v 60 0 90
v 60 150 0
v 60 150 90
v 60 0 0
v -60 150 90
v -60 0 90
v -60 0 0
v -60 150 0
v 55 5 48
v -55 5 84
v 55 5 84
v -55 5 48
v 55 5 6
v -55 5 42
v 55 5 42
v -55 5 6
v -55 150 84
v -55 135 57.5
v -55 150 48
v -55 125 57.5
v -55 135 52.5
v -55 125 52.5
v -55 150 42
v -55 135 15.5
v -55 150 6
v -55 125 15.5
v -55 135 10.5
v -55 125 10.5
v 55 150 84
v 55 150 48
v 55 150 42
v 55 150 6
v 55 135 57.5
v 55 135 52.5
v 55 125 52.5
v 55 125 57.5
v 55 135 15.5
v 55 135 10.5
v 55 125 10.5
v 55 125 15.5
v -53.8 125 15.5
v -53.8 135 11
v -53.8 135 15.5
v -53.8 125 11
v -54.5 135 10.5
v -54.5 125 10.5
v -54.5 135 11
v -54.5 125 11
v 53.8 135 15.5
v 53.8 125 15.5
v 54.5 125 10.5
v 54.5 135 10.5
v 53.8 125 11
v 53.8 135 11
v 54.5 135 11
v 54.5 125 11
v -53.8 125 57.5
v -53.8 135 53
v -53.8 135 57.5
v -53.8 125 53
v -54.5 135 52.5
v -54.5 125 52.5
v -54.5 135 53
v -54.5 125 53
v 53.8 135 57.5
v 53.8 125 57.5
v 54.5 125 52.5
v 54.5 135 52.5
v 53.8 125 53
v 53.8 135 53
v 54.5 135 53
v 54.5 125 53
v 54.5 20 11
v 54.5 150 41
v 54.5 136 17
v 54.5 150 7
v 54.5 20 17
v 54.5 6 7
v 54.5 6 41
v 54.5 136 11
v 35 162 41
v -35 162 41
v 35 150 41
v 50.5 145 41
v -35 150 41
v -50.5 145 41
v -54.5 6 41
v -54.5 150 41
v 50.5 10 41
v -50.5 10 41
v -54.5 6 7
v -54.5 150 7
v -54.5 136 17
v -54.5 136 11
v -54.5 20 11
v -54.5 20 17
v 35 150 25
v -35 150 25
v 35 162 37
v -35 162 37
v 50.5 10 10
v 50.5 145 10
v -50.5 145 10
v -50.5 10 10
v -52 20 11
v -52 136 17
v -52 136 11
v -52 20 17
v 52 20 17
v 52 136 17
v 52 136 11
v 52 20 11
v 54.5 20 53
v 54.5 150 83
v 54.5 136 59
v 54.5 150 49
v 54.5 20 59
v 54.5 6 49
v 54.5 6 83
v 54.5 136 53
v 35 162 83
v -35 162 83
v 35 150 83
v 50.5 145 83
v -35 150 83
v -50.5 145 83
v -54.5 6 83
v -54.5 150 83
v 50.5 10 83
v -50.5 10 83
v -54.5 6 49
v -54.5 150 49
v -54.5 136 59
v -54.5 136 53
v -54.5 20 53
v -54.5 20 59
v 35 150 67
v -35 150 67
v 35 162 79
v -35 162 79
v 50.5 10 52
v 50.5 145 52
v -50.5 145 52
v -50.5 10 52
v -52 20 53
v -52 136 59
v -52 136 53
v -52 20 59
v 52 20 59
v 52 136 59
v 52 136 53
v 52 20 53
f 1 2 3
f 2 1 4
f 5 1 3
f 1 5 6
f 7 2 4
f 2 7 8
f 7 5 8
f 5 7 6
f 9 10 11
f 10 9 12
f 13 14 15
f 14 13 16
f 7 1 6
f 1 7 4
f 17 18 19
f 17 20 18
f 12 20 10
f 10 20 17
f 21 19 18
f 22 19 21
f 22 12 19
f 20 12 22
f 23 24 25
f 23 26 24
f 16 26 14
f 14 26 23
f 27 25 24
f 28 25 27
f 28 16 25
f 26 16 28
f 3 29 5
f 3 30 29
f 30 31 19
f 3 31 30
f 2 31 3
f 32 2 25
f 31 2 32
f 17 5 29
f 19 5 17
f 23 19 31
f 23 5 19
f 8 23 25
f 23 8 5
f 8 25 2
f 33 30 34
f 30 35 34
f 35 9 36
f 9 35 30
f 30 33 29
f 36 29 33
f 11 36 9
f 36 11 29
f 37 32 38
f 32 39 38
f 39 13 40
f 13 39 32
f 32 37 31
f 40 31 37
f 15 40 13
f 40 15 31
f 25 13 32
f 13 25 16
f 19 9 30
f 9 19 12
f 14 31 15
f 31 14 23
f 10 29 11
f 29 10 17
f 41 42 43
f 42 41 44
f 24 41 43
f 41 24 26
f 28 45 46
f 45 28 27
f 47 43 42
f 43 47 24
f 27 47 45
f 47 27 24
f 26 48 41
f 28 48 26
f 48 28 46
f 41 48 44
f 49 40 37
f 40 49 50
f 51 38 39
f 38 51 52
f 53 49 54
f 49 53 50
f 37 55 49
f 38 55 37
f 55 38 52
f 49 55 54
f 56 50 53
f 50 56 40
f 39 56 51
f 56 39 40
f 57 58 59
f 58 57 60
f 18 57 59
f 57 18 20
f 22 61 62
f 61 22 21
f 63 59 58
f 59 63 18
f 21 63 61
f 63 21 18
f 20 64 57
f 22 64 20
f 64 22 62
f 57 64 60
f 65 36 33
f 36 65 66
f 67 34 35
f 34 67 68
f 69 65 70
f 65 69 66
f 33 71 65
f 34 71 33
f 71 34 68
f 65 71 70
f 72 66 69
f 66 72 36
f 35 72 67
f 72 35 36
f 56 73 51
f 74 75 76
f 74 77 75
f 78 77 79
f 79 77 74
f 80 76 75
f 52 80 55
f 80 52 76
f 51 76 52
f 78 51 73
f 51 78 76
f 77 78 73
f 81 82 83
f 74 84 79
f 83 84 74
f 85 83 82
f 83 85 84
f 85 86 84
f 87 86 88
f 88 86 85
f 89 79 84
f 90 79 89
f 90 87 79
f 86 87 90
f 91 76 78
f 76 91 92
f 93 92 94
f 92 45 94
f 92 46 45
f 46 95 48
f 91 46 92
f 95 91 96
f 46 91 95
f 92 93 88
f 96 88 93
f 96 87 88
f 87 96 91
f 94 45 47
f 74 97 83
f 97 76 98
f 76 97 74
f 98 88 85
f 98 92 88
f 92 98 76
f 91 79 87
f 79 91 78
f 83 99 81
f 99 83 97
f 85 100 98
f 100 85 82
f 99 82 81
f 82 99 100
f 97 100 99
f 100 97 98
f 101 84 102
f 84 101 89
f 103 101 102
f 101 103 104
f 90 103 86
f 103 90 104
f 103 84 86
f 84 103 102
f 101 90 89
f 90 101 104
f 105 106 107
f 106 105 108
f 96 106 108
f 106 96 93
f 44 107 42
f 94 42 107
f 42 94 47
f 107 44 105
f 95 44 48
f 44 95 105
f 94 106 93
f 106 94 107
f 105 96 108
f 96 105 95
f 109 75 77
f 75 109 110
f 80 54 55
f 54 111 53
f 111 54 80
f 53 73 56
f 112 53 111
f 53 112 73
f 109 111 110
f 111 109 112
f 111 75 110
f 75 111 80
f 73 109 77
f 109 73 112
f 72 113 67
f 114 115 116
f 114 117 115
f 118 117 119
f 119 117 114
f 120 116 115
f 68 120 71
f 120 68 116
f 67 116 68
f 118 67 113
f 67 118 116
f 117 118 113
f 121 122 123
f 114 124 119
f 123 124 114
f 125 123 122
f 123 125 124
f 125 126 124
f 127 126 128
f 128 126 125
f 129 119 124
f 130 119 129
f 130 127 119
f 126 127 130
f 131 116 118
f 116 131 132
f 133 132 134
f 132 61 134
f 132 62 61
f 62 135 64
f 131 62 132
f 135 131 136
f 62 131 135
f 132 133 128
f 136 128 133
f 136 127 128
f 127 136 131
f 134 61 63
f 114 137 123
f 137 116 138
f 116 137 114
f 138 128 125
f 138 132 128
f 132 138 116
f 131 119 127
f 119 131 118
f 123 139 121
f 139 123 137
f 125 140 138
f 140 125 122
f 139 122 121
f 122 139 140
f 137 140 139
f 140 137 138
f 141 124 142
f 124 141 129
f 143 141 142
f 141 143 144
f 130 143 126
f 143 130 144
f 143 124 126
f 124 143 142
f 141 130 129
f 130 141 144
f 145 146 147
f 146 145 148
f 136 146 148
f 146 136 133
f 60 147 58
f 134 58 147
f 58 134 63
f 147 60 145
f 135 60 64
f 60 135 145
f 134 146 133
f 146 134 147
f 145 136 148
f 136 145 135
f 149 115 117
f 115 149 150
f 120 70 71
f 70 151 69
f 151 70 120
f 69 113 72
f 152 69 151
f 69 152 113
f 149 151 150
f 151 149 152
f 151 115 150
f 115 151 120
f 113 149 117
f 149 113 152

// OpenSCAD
part = "assembly"; // [assembly:Assembly, frame:Frame, drawer:Drawer]
cadverify_only = "";
module instance(name, part, unit = 1) {
    echo(cadverify_instance = [name, part, unit]);
    if (cadverify_only == "" || cadverify_only == name) children();
}
// frame assembly coords: X -60..60, Y 0..150, Z 0..90
module frame_asm() {
    union() {
        translate([-60,0,0]) cube([120,5,90]);
        translate([-60,0,0]) cube([5,150,90]);
        translate([55,0,0]) cube([5,150,90]);
        translate([-55,5,0]) cube([110,145,6]);
        translate([-55,5,42]) cube([110,145,6]);
        translate([-55,5,84]) cube([110,145,6]);
        translate([-55,125,10.5]) cube([1.2,10,5]);
        translate([53.8,125,10.5]) cube([1.2,10,5]);
        translate([-55,125,52.5]) cube([1.2,10,5]);
        translate([53.8,125,52.5]) cube([1.2,10,5]);
    }
}
module frame_print() {
    translate([0,90,0]) rotate([90,0,0]) frame_asm();
}
// drawer part coords: X -54.5..54.5, Y 0..144 body + handle to 156, Z 0..34
module drawer_raw() {
    difference() {
        union() {
            translate([-54.5,0,0]) cube([109,144,34]);
            // handle tip block
            translate([-35,144,30]) cube([70,12,4]);
            // handle wedge (triangular prism)
            polyhedron(points=[[-35,144,18],[-35,144,30],[-35,156,30],[35,144,18],[35,144,30],[35,156,30]], faces=[[0,1,2],[3,5,4],[0,3,4,1],[1,4,5,2],[0,2,5,3]]);
        }
        translate([-50.5,4,3]) cube([101,135,32]);
        translate([-54.5,14,4]) cube([2.5,116,6]);
        translate([52,14,4]) cube([2.5,116,6]);
    }
}
module drawer_part() { drawer_raw(); }
module frame_spec() {
    echo(cadverify_spec = [
        ["bounds", [[-60,0,0],[60,90,150]]],
        ["bodies", 1],
        ["through_holes", 0],
        ["support_faces", [["bed","-z",5000]]],
        ["overhangs_allowed", [
            ["stop tab underside, bridge 2.4mm", [[-55,74.5,124],[-53.8,79.5,126]]],
            ["stop tab underside, bridge 2.4mm", [[53.8,74.5,124],[55,79.5,126]]],
            ["stop tab underside, bridge 2.4mm", [[-55,32.5,124],[-53.8,37.5,126]]],
            ["stop tab underside, bridge 2.4mm", [[53.8,32.5,124],[55,37.5,126]]]
        ]],
        ["copies", 1],
        ["details", [
            ["back_panel","material",[[-60,0,0],[60,90,5]],0.9],
            ["stop_tab_ll","material",[[-55,74.5,125],[-53.8,79.5,135]],0.9],
            ["stop_tab_lr","material",[[53.8,74.5,125],[55,79.5,135]],0.9],
            ["stop_tab_ul","material",[[-55,32.5,125],[-53.8,37.5,135]],0.9],
            ["stop_tab_ur","material",[[53.8,32.5,125],[55,37.5,135]],0.9],
            ["lower_cavity","void",[[-55,48,5],[55,84,150]],0.9],
            ["upper_cavity","void",[[-55,6,5],[55,42,150]],0.9],
            ["back","thickness",[0,10,-1],[0,0,1],5]
        ]]
    ]);
}
module drawer_spec() {
    echo(cadverify_spec = [
        ["bounds", [[-54.5,0,0],[54.5,156,34]]],
        ["bodies", 1],
        ["through_holes", 0],
        ["support_faces", [["bed","-z",10000]]],
        ["overhangs_allowed", [
            ["drawer slide groove ceiling, bridge 5mm", [[-54.5,14,9],[-52,130,11]]],
            ["drawer slide groove ceiling, bridge 5mm", [[52,14,9],[54.5,130,11]]]
        ]],
        ["copies", 2],
        ["details", [
            ["pull_tip","material",[[-35,150,30],[35,156,34]],0.9],
            ["groove_left","void",[[-54.5,14,4],[-52,130,10]],0.9],
            ["groove_right","void",[[52,14,4],[54.5,130,10]],0.9],
            ["drawer_cavity","void",[[-50.5,4,3],[50.5,139,34]],0.9],
            ["bottom","thickness",[0,70,-1],[0,0,1],3],
            ["side_walls","thickness",[-55.5,70,20],[1,0,0],8],
            ["pull_shape","view",[[-35,144,18],[35,156,34]]]
        ]]
    ]);
}
module assembly_spec() {
    echo(cadverify_spec = [
        ["bounds", [[-60,0,0],[60,162,90]]],
        ["support_faces", [["base","-z",5000]]],
        ["allowed_interferences", []],
        ["motions", [
            ["drawer_lower_slide", ["drawer_lower"], "slide", [0,1,0], [0,105], ["stops", [0,105]]],
            ["drawer_upper_slide", ["drawer_upper"], "slide", [0,1,0], [0,105], ["stops", [0,105]]]
        ]],
        ["assembly_order", [
            [["frame"], [0,0,0]],
            [["drawer_lower"], [0,-1,0], ["flex", [["drawer_lower","frame",0.7,"stop tabs snap into grooves"]]]],
            [["drawer_upper"], [0,-1,0], ["flex", [["drawer_upper","frame",0.7,"stop tabs snap into grooves"]]]]
        ]]
    ]);
}
if (part == "frame") { frame_spec(); frame_print(); }
else if (part == "drawer") { drawer_spec(); drawer_part(); }
else if (part == "assembly") {
    assembly_spec();
    instance("frame","frame",1) frame_asm();
    instance("drawer_lower","drawer",1) translate([0,6,7]) drawer_raw();
    instance("drawer_upper","drawer",1) translate([0,6,49]) drawer_raw();
}
